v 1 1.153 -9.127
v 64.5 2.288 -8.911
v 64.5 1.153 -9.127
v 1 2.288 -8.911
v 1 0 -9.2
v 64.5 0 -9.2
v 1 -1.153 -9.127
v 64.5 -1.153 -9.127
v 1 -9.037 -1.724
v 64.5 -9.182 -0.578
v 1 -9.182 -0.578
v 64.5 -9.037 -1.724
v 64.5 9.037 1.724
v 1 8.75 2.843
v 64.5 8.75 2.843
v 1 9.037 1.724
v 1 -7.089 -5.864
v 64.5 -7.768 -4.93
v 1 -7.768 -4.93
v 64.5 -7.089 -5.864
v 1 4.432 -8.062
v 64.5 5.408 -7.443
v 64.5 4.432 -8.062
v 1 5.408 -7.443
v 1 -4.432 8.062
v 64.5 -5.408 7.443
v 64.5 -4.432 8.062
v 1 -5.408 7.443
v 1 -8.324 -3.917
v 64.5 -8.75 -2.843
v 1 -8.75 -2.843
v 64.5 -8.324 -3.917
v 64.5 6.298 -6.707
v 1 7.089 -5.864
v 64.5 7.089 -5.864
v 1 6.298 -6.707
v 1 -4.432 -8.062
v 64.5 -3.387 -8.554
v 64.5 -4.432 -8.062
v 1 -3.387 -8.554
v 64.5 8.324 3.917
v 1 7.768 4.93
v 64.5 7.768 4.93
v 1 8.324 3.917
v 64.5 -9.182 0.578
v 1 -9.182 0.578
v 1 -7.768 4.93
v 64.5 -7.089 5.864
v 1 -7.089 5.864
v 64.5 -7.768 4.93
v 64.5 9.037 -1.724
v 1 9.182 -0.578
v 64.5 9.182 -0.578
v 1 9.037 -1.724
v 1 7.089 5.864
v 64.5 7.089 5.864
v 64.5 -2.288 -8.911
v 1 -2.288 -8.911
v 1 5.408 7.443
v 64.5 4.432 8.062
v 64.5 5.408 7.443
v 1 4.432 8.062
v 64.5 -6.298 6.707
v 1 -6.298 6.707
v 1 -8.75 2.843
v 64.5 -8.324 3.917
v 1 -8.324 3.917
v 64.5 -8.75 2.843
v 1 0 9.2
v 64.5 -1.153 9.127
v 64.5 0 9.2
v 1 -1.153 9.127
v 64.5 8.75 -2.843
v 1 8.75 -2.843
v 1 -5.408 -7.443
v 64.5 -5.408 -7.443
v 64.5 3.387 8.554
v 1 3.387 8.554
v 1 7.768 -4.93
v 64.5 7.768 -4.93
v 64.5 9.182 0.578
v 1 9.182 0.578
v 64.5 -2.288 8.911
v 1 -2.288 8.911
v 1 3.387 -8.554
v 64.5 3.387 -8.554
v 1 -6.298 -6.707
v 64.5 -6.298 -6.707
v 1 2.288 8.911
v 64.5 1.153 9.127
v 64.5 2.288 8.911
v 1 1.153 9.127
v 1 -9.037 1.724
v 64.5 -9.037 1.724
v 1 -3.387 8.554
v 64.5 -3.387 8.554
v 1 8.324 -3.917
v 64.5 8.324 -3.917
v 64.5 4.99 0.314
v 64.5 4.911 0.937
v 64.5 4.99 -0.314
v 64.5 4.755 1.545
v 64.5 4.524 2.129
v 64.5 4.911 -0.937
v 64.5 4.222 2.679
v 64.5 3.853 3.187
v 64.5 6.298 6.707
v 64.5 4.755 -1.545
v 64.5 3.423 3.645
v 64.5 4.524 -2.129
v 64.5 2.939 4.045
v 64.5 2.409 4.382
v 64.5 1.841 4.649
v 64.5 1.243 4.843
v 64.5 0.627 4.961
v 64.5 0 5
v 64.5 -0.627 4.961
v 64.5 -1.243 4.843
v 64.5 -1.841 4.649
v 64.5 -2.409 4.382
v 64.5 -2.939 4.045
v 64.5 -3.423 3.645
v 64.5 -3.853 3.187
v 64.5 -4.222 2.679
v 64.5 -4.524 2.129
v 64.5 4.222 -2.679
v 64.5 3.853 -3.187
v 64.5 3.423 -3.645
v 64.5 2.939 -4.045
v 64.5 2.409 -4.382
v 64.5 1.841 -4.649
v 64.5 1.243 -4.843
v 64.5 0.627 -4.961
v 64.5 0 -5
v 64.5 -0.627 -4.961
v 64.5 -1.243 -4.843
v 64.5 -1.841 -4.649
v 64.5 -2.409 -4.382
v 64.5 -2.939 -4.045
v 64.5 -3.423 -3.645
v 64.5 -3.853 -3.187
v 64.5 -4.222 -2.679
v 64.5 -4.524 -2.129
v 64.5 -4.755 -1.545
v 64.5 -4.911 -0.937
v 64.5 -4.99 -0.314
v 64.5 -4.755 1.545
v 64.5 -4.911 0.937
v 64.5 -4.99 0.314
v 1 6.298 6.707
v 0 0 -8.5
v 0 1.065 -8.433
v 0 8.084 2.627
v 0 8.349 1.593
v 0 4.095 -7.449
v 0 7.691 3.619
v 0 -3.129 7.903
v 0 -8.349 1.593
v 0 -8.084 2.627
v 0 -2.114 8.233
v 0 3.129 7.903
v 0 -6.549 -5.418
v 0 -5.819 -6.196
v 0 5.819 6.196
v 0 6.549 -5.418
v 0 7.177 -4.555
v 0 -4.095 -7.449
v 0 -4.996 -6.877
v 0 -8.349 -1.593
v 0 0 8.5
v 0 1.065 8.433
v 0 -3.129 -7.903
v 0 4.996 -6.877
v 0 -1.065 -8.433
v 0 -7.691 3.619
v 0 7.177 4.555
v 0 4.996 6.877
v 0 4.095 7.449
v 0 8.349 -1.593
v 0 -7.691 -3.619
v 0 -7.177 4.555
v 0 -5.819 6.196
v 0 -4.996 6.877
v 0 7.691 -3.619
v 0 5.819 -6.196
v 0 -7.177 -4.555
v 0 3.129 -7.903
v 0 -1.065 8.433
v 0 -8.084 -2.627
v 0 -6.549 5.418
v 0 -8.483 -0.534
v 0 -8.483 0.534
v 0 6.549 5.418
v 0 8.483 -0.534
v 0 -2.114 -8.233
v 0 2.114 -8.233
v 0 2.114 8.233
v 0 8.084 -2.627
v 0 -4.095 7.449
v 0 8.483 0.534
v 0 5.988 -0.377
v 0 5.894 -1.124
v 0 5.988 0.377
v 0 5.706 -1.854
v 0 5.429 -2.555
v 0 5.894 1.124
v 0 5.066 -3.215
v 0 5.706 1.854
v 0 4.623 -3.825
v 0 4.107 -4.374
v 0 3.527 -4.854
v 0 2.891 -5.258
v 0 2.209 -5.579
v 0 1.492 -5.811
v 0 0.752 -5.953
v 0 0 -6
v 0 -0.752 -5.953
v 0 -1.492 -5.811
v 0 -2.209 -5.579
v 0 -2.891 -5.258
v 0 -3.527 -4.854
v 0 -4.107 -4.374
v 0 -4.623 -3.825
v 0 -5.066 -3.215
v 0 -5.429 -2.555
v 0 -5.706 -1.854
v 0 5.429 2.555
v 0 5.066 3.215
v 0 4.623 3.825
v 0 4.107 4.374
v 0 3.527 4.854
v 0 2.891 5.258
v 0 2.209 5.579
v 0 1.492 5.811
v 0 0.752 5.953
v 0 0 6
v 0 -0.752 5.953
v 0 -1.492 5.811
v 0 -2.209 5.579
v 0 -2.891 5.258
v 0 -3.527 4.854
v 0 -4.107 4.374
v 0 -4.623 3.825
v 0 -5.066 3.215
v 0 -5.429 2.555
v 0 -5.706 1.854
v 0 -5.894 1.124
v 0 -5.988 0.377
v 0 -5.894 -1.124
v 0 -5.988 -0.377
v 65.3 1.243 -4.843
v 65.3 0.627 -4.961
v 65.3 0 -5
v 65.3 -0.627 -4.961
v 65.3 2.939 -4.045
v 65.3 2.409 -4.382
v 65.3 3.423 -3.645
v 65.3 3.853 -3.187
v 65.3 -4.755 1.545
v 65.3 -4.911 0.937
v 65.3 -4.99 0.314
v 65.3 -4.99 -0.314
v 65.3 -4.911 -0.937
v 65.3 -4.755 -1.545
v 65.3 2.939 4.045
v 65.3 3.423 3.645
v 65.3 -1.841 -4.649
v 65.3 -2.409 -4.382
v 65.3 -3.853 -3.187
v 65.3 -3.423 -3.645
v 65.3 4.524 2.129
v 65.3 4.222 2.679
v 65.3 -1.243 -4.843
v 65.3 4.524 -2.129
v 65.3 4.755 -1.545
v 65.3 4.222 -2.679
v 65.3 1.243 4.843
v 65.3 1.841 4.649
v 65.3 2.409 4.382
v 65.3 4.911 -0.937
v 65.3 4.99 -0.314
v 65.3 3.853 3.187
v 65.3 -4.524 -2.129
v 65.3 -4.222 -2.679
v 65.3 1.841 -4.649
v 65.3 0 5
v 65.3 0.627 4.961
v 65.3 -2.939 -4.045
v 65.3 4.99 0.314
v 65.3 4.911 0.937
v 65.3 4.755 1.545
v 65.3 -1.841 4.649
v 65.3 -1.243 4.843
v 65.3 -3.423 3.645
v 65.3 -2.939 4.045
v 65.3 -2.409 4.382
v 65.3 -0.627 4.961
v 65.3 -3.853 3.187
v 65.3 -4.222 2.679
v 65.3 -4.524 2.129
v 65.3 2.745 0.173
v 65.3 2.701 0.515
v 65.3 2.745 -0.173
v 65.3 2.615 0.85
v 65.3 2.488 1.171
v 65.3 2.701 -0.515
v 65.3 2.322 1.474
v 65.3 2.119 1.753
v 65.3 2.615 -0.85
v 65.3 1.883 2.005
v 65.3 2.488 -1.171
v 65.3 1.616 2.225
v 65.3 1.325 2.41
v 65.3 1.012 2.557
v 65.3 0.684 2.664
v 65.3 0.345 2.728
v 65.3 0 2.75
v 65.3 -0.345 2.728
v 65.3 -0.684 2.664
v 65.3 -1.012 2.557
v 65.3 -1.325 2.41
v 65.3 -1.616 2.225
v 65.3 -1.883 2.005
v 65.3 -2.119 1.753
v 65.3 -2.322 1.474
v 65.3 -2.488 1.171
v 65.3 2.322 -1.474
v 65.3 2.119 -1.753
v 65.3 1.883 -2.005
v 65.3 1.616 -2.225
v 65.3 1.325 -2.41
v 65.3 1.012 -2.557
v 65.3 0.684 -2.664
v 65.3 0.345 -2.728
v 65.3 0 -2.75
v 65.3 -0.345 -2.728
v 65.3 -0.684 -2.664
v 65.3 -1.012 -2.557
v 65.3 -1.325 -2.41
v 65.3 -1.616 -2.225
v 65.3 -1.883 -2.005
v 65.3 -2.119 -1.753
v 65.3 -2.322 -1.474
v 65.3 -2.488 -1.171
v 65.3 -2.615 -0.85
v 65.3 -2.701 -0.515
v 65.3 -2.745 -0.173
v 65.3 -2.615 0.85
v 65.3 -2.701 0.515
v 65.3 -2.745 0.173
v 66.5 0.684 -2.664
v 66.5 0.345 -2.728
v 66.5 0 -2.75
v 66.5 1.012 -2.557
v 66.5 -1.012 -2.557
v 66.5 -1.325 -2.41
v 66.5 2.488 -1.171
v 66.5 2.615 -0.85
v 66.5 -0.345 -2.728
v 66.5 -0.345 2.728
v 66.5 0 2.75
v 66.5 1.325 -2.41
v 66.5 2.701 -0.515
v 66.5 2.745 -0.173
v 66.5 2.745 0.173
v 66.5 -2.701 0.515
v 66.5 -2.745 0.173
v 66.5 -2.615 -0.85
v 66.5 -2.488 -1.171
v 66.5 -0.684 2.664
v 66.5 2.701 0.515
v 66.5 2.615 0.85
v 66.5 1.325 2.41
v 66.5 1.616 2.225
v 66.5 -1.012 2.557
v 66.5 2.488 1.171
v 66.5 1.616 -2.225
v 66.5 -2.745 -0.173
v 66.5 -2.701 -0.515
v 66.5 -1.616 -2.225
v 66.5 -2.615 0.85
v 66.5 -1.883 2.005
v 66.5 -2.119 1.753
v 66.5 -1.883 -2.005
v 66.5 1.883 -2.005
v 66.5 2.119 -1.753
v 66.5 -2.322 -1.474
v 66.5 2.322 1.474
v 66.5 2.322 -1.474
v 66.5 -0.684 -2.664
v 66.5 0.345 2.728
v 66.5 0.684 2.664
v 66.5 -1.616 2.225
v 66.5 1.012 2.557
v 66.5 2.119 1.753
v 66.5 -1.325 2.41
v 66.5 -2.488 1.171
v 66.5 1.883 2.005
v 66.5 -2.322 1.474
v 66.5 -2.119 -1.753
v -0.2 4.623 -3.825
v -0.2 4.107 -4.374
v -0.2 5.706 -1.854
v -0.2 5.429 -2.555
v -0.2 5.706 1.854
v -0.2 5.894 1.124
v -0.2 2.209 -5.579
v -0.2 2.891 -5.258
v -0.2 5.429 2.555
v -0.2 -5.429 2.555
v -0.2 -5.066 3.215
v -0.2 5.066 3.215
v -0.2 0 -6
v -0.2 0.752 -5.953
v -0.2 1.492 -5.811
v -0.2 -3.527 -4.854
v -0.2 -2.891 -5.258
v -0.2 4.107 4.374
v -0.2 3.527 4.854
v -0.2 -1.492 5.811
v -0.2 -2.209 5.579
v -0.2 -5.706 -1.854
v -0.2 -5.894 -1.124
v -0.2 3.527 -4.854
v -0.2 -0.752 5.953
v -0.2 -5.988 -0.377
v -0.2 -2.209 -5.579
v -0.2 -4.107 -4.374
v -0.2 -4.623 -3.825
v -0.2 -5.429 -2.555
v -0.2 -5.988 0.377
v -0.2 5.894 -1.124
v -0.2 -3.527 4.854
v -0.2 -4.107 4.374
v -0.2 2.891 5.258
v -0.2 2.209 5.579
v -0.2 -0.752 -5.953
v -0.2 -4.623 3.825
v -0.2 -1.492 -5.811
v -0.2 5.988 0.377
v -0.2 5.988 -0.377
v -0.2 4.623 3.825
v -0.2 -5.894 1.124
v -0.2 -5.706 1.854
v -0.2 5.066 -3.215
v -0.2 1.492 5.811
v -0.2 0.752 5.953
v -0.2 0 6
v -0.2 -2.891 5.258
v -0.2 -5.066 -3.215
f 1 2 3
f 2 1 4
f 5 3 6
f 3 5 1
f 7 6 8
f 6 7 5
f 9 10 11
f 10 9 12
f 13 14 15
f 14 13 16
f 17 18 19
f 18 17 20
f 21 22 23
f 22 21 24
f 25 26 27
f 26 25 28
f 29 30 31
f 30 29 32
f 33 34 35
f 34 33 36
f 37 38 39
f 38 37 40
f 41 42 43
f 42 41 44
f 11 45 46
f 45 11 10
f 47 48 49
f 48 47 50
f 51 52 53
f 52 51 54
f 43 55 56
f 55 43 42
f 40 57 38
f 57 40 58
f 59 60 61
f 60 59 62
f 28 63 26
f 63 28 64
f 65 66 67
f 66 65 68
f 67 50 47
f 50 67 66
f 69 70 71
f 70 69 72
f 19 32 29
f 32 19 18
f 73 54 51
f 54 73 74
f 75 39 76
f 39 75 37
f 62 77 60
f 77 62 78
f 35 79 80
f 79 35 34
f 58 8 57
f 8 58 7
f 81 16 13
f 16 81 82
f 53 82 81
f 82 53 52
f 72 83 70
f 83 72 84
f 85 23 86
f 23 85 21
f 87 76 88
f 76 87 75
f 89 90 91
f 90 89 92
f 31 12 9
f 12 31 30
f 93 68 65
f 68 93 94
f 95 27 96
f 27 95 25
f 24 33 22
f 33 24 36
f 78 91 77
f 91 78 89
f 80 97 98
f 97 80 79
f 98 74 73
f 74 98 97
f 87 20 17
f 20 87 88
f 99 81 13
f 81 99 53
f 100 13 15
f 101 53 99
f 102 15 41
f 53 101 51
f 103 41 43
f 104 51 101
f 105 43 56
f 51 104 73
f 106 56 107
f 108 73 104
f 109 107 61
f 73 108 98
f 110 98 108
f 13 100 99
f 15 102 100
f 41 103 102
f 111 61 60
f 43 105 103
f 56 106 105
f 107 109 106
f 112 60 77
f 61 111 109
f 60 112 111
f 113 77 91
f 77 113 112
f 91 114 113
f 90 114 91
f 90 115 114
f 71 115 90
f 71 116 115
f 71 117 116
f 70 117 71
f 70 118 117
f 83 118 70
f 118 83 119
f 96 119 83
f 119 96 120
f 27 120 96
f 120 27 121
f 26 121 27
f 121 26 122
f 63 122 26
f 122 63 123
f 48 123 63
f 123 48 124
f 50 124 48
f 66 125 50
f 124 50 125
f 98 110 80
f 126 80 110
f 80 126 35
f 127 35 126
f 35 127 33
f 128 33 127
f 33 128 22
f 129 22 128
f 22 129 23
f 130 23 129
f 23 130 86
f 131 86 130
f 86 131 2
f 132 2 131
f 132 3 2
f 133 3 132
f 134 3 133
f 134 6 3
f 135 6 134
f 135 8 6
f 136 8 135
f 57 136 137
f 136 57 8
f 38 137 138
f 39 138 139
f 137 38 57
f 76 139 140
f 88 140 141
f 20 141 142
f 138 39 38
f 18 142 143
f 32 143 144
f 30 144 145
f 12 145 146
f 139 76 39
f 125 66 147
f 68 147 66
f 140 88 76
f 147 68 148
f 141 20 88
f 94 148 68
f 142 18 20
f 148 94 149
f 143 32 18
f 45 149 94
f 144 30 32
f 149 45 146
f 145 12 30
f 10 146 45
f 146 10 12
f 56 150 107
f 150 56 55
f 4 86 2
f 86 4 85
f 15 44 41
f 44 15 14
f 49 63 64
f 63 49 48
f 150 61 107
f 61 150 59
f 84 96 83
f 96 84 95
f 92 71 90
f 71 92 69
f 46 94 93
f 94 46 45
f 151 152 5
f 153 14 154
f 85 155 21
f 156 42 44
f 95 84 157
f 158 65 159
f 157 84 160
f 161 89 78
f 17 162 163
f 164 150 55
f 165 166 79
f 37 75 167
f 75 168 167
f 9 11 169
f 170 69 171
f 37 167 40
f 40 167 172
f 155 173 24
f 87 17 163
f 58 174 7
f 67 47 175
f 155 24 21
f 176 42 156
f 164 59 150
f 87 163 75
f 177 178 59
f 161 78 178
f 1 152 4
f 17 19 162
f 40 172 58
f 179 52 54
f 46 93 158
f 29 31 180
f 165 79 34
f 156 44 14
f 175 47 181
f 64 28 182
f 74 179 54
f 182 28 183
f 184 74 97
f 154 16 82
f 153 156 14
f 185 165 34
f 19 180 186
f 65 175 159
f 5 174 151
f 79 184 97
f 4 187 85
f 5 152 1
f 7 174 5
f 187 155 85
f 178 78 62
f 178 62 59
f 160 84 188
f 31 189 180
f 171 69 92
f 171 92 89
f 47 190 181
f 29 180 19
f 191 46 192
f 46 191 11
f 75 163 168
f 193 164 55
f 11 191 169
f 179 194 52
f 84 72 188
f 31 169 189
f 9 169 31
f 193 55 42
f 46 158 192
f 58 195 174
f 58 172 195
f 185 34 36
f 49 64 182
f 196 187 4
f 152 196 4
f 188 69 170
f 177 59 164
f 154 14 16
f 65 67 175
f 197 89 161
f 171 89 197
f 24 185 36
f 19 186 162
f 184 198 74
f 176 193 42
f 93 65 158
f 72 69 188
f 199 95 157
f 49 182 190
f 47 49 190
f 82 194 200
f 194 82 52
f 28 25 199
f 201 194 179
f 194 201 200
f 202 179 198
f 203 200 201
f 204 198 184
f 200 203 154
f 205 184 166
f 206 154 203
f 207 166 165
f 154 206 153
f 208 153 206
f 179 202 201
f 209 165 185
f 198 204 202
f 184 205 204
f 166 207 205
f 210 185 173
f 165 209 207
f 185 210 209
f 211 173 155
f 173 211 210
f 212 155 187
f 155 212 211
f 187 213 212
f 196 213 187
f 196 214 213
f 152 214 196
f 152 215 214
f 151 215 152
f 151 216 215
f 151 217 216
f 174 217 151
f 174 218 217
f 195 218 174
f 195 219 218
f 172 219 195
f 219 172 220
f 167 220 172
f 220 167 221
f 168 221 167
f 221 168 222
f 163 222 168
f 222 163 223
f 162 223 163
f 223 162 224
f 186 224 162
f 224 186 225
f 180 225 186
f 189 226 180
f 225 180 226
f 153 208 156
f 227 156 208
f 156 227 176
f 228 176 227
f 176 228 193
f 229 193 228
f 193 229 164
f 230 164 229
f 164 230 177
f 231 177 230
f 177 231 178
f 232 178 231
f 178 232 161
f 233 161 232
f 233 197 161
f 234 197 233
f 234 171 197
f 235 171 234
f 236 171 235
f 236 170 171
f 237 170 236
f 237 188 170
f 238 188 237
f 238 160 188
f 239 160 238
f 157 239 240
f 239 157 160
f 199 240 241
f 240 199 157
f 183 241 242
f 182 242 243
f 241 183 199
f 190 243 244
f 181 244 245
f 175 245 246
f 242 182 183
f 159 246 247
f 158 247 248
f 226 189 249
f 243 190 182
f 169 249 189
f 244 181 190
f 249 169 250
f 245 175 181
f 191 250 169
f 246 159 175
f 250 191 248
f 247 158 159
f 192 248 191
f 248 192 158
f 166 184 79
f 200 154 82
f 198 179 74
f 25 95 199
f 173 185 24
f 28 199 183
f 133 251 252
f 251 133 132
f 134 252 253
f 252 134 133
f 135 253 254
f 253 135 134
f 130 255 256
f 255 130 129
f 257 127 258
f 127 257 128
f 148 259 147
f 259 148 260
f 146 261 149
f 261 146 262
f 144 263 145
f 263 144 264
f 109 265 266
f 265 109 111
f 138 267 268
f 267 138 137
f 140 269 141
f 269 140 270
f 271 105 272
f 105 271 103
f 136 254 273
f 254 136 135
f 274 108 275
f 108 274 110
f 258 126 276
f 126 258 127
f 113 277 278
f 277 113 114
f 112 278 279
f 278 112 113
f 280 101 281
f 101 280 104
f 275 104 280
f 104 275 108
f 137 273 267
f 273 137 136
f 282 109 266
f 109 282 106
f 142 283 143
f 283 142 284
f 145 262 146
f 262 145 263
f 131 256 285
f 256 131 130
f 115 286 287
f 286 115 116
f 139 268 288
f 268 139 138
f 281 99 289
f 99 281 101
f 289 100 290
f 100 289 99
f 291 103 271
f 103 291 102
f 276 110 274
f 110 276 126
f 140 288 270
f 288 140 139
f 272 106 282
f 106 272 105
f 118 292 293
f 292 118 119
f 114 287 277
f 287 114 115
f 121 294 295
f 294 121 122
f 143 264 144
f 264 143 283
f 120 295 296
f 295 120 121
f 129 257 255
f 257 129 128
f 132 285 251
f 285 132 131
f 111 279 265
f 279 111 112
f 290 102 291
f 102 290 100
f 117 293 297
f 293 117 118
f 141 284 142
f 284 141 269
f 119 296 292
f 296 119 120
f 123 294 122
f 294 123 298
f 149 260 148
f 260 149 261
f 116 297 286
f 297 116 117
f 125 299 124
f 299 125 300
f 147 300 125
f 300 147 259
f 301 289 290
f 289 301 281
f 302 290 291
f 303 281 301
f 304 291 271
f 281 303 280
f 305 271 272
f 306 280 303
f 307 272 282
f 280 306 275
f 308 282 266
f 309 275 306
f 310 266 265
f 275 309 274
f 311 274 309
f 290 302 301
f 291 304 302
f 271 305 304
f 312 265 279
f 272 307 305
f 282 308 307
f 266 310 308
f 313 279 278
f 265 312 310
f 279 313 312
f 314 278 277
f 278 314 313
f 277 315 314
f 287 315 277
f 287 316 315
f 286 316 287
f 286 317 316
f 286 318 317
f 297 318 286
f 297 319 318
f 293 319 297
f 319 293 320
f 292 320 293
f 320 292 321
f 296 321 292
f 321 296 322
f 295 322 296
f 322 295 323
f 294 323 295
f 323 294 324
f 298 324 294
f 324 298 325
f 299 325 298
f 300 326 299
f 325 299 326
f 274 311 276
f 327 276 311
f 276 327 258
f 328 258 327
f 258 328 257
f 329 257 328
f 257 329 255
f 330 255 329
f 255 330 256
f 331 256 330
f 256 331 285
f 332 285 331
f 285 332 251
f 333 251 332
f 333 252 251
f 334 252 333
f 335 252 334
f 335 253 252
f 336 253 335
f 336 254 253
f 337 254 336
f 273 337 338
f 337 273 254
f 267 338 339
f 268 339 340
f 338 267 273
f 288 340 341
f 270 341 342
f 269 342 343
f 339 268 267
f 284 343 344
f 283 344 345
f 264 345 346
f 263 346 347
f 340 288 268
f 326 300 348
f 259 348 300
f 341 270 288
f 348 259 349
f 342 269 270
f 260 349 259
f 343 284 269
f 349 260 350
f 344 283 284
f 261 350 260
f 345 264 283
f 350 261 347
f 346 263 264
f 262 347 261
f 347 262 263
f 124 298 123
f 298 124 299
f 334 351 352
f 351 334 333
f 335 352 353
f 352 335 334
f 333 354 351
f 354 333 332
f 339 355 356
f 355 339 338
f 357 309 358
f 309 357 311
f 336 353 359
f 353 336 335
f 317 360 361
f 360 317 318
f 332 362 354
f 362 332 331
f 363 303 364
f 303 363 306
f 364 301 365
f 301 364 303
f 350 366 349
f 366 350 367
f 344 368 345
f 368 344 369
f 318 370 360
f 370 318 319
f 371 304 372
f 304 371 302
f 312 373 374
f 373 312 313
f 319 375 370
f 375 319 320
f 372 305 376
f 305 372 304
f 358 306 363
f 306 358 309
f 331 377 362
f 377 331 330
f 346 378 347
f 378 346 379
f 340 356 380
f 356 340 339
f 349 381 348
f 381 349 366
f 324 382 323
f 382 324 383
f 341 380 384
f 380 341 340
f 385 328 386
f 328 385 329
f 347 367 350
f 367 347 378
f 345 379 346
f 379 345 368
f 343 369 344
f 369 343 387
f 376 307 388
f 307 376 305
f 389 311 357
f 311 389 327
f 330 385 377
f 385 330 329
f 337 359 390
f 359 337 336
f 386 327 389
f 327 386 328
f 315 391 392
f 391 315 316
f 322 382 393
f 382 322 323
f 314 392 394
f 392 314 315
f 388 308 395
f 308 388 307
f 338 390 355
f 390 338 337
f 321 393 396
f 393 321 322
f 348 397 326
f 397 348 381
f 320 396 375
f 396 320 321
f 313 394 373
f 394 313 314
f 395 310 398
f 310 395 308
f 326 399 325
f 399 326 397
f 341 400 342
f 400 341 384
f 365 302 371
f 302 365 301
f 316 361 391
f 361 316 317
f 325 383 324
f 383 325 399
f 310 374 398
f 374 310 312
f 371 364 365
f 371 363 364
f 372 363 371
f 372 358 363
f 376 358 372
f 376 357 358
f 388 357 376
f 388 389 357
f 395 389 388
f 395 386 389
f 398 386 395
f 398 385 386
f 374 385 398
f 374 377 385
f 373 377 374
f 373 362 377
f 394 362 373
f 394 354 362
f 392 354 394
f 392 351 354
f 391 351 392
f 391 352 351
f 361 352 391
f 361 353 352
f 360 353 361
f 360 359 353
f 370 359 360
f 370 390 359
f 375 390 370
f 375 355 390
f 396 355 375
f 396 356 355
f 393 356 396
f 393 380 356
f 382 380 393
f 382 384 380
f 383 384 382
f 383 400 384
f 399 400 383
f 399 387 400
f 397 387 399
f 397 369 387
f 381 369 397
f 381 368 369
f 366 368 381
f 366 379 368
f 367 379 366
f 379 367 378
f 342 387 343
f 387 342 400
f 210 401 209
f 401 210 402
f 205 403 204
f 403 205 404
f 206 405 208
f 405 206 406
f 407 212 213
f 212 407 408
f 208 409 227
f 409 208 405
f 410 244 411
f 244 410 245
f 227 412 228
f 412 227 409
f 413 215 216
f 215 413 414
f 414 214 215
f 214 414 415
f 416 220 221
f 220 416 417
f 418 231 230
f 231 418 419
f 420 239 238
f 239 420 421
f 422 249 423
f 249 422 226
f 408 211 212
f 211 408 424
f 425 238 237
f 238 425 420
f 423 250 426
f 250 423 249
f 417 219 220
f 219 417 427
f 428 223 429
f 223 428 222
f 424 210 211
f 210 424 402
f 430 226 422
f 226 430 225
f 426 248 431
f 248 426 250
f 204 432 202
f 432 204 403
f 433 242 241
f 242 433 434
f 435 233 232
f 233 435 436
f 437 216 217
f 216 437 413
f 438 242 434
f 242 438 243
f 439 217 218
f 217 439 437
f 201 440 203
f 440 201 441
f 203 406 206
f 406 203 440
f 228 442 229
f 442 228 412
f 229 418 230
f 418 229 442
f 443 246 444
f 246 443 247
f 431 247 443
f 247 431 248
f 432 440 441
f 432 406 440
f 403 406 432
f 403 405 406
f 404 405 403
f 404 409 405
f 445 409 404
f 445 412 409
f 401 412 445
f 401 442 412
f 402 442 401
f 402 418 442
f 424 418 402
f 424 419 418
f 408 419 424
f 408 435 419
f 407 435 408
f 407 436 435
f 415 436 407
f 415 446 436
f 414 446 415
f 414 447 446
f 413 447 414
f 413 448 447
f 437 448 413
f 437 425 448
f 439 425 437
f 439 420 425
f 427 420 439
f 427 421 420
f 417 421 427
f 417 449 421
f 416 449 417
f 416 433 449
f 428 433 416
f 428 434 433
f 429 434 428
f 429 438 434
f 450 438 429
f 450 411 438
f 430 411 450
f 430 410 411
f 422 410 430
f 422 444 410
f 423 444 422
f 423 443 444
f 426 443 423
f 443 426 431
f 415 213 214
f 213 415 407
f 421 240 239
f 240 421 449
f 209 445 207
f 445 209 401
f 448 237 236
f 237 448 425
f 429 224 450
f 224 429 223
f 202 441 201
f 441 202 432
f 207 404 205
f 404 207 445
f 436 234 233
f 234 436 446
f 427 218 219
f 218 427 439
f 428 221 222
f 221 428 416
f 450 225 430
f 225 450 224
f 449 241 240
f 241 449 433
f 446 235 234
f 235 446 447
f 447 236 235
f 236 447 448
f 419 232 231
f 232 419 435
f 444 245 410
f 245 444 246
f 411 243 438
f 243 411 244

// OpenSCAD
// ===================================================================
// 标准 18650 锂离子电芯 (18650 Li-ion Cell)
// 工业标准 1:1 CAD 实体模型
// ===================================================================

$fn = 50;

module battery_18650() {
    // 直径 Ø18.4mm，长度 65.0mm (平头) ~ 66.5mm (凸头带保护板)
    // 经典青蓝色绝缘热缩套管 (Cyan/Green PVC Wrap)
    color([0.1, 0.65, 0.65]) {
        // 主圆柱体 (长 63.5mm)
        translate([0, 0, 1.0])
            cylinder(d=18.4, h=63.5);
        // 底部负极绝缘倒角环
        translate([0, 0, 0])
            cylinder(d1=17.0, d2=18.4, h=1.0);
    }

    // 负极平底金属垫片 (镀镍钢片)
    color([0.85, 0.85, 0.88]) {
        translate([0, 0, -0.2])
            cylinder(d=12.0, h=0.3);
    }

    // 正极凸头垫片 (Button Top with vent rim)
    color([0.9, 0.9, 0.92]) {
        // 阶梯台阶
        translate([0, 0, 64.5])
            cylinder(d=10.0, h=0.8);
        // 正极触点凸帽
        translate([0, 0, 65.3])
            cylinder(d=5.5, h=1.2);
    }
}

// 水平卧式放置方便装配预览
rotate([0, 90, 0])
    battery_18650();
